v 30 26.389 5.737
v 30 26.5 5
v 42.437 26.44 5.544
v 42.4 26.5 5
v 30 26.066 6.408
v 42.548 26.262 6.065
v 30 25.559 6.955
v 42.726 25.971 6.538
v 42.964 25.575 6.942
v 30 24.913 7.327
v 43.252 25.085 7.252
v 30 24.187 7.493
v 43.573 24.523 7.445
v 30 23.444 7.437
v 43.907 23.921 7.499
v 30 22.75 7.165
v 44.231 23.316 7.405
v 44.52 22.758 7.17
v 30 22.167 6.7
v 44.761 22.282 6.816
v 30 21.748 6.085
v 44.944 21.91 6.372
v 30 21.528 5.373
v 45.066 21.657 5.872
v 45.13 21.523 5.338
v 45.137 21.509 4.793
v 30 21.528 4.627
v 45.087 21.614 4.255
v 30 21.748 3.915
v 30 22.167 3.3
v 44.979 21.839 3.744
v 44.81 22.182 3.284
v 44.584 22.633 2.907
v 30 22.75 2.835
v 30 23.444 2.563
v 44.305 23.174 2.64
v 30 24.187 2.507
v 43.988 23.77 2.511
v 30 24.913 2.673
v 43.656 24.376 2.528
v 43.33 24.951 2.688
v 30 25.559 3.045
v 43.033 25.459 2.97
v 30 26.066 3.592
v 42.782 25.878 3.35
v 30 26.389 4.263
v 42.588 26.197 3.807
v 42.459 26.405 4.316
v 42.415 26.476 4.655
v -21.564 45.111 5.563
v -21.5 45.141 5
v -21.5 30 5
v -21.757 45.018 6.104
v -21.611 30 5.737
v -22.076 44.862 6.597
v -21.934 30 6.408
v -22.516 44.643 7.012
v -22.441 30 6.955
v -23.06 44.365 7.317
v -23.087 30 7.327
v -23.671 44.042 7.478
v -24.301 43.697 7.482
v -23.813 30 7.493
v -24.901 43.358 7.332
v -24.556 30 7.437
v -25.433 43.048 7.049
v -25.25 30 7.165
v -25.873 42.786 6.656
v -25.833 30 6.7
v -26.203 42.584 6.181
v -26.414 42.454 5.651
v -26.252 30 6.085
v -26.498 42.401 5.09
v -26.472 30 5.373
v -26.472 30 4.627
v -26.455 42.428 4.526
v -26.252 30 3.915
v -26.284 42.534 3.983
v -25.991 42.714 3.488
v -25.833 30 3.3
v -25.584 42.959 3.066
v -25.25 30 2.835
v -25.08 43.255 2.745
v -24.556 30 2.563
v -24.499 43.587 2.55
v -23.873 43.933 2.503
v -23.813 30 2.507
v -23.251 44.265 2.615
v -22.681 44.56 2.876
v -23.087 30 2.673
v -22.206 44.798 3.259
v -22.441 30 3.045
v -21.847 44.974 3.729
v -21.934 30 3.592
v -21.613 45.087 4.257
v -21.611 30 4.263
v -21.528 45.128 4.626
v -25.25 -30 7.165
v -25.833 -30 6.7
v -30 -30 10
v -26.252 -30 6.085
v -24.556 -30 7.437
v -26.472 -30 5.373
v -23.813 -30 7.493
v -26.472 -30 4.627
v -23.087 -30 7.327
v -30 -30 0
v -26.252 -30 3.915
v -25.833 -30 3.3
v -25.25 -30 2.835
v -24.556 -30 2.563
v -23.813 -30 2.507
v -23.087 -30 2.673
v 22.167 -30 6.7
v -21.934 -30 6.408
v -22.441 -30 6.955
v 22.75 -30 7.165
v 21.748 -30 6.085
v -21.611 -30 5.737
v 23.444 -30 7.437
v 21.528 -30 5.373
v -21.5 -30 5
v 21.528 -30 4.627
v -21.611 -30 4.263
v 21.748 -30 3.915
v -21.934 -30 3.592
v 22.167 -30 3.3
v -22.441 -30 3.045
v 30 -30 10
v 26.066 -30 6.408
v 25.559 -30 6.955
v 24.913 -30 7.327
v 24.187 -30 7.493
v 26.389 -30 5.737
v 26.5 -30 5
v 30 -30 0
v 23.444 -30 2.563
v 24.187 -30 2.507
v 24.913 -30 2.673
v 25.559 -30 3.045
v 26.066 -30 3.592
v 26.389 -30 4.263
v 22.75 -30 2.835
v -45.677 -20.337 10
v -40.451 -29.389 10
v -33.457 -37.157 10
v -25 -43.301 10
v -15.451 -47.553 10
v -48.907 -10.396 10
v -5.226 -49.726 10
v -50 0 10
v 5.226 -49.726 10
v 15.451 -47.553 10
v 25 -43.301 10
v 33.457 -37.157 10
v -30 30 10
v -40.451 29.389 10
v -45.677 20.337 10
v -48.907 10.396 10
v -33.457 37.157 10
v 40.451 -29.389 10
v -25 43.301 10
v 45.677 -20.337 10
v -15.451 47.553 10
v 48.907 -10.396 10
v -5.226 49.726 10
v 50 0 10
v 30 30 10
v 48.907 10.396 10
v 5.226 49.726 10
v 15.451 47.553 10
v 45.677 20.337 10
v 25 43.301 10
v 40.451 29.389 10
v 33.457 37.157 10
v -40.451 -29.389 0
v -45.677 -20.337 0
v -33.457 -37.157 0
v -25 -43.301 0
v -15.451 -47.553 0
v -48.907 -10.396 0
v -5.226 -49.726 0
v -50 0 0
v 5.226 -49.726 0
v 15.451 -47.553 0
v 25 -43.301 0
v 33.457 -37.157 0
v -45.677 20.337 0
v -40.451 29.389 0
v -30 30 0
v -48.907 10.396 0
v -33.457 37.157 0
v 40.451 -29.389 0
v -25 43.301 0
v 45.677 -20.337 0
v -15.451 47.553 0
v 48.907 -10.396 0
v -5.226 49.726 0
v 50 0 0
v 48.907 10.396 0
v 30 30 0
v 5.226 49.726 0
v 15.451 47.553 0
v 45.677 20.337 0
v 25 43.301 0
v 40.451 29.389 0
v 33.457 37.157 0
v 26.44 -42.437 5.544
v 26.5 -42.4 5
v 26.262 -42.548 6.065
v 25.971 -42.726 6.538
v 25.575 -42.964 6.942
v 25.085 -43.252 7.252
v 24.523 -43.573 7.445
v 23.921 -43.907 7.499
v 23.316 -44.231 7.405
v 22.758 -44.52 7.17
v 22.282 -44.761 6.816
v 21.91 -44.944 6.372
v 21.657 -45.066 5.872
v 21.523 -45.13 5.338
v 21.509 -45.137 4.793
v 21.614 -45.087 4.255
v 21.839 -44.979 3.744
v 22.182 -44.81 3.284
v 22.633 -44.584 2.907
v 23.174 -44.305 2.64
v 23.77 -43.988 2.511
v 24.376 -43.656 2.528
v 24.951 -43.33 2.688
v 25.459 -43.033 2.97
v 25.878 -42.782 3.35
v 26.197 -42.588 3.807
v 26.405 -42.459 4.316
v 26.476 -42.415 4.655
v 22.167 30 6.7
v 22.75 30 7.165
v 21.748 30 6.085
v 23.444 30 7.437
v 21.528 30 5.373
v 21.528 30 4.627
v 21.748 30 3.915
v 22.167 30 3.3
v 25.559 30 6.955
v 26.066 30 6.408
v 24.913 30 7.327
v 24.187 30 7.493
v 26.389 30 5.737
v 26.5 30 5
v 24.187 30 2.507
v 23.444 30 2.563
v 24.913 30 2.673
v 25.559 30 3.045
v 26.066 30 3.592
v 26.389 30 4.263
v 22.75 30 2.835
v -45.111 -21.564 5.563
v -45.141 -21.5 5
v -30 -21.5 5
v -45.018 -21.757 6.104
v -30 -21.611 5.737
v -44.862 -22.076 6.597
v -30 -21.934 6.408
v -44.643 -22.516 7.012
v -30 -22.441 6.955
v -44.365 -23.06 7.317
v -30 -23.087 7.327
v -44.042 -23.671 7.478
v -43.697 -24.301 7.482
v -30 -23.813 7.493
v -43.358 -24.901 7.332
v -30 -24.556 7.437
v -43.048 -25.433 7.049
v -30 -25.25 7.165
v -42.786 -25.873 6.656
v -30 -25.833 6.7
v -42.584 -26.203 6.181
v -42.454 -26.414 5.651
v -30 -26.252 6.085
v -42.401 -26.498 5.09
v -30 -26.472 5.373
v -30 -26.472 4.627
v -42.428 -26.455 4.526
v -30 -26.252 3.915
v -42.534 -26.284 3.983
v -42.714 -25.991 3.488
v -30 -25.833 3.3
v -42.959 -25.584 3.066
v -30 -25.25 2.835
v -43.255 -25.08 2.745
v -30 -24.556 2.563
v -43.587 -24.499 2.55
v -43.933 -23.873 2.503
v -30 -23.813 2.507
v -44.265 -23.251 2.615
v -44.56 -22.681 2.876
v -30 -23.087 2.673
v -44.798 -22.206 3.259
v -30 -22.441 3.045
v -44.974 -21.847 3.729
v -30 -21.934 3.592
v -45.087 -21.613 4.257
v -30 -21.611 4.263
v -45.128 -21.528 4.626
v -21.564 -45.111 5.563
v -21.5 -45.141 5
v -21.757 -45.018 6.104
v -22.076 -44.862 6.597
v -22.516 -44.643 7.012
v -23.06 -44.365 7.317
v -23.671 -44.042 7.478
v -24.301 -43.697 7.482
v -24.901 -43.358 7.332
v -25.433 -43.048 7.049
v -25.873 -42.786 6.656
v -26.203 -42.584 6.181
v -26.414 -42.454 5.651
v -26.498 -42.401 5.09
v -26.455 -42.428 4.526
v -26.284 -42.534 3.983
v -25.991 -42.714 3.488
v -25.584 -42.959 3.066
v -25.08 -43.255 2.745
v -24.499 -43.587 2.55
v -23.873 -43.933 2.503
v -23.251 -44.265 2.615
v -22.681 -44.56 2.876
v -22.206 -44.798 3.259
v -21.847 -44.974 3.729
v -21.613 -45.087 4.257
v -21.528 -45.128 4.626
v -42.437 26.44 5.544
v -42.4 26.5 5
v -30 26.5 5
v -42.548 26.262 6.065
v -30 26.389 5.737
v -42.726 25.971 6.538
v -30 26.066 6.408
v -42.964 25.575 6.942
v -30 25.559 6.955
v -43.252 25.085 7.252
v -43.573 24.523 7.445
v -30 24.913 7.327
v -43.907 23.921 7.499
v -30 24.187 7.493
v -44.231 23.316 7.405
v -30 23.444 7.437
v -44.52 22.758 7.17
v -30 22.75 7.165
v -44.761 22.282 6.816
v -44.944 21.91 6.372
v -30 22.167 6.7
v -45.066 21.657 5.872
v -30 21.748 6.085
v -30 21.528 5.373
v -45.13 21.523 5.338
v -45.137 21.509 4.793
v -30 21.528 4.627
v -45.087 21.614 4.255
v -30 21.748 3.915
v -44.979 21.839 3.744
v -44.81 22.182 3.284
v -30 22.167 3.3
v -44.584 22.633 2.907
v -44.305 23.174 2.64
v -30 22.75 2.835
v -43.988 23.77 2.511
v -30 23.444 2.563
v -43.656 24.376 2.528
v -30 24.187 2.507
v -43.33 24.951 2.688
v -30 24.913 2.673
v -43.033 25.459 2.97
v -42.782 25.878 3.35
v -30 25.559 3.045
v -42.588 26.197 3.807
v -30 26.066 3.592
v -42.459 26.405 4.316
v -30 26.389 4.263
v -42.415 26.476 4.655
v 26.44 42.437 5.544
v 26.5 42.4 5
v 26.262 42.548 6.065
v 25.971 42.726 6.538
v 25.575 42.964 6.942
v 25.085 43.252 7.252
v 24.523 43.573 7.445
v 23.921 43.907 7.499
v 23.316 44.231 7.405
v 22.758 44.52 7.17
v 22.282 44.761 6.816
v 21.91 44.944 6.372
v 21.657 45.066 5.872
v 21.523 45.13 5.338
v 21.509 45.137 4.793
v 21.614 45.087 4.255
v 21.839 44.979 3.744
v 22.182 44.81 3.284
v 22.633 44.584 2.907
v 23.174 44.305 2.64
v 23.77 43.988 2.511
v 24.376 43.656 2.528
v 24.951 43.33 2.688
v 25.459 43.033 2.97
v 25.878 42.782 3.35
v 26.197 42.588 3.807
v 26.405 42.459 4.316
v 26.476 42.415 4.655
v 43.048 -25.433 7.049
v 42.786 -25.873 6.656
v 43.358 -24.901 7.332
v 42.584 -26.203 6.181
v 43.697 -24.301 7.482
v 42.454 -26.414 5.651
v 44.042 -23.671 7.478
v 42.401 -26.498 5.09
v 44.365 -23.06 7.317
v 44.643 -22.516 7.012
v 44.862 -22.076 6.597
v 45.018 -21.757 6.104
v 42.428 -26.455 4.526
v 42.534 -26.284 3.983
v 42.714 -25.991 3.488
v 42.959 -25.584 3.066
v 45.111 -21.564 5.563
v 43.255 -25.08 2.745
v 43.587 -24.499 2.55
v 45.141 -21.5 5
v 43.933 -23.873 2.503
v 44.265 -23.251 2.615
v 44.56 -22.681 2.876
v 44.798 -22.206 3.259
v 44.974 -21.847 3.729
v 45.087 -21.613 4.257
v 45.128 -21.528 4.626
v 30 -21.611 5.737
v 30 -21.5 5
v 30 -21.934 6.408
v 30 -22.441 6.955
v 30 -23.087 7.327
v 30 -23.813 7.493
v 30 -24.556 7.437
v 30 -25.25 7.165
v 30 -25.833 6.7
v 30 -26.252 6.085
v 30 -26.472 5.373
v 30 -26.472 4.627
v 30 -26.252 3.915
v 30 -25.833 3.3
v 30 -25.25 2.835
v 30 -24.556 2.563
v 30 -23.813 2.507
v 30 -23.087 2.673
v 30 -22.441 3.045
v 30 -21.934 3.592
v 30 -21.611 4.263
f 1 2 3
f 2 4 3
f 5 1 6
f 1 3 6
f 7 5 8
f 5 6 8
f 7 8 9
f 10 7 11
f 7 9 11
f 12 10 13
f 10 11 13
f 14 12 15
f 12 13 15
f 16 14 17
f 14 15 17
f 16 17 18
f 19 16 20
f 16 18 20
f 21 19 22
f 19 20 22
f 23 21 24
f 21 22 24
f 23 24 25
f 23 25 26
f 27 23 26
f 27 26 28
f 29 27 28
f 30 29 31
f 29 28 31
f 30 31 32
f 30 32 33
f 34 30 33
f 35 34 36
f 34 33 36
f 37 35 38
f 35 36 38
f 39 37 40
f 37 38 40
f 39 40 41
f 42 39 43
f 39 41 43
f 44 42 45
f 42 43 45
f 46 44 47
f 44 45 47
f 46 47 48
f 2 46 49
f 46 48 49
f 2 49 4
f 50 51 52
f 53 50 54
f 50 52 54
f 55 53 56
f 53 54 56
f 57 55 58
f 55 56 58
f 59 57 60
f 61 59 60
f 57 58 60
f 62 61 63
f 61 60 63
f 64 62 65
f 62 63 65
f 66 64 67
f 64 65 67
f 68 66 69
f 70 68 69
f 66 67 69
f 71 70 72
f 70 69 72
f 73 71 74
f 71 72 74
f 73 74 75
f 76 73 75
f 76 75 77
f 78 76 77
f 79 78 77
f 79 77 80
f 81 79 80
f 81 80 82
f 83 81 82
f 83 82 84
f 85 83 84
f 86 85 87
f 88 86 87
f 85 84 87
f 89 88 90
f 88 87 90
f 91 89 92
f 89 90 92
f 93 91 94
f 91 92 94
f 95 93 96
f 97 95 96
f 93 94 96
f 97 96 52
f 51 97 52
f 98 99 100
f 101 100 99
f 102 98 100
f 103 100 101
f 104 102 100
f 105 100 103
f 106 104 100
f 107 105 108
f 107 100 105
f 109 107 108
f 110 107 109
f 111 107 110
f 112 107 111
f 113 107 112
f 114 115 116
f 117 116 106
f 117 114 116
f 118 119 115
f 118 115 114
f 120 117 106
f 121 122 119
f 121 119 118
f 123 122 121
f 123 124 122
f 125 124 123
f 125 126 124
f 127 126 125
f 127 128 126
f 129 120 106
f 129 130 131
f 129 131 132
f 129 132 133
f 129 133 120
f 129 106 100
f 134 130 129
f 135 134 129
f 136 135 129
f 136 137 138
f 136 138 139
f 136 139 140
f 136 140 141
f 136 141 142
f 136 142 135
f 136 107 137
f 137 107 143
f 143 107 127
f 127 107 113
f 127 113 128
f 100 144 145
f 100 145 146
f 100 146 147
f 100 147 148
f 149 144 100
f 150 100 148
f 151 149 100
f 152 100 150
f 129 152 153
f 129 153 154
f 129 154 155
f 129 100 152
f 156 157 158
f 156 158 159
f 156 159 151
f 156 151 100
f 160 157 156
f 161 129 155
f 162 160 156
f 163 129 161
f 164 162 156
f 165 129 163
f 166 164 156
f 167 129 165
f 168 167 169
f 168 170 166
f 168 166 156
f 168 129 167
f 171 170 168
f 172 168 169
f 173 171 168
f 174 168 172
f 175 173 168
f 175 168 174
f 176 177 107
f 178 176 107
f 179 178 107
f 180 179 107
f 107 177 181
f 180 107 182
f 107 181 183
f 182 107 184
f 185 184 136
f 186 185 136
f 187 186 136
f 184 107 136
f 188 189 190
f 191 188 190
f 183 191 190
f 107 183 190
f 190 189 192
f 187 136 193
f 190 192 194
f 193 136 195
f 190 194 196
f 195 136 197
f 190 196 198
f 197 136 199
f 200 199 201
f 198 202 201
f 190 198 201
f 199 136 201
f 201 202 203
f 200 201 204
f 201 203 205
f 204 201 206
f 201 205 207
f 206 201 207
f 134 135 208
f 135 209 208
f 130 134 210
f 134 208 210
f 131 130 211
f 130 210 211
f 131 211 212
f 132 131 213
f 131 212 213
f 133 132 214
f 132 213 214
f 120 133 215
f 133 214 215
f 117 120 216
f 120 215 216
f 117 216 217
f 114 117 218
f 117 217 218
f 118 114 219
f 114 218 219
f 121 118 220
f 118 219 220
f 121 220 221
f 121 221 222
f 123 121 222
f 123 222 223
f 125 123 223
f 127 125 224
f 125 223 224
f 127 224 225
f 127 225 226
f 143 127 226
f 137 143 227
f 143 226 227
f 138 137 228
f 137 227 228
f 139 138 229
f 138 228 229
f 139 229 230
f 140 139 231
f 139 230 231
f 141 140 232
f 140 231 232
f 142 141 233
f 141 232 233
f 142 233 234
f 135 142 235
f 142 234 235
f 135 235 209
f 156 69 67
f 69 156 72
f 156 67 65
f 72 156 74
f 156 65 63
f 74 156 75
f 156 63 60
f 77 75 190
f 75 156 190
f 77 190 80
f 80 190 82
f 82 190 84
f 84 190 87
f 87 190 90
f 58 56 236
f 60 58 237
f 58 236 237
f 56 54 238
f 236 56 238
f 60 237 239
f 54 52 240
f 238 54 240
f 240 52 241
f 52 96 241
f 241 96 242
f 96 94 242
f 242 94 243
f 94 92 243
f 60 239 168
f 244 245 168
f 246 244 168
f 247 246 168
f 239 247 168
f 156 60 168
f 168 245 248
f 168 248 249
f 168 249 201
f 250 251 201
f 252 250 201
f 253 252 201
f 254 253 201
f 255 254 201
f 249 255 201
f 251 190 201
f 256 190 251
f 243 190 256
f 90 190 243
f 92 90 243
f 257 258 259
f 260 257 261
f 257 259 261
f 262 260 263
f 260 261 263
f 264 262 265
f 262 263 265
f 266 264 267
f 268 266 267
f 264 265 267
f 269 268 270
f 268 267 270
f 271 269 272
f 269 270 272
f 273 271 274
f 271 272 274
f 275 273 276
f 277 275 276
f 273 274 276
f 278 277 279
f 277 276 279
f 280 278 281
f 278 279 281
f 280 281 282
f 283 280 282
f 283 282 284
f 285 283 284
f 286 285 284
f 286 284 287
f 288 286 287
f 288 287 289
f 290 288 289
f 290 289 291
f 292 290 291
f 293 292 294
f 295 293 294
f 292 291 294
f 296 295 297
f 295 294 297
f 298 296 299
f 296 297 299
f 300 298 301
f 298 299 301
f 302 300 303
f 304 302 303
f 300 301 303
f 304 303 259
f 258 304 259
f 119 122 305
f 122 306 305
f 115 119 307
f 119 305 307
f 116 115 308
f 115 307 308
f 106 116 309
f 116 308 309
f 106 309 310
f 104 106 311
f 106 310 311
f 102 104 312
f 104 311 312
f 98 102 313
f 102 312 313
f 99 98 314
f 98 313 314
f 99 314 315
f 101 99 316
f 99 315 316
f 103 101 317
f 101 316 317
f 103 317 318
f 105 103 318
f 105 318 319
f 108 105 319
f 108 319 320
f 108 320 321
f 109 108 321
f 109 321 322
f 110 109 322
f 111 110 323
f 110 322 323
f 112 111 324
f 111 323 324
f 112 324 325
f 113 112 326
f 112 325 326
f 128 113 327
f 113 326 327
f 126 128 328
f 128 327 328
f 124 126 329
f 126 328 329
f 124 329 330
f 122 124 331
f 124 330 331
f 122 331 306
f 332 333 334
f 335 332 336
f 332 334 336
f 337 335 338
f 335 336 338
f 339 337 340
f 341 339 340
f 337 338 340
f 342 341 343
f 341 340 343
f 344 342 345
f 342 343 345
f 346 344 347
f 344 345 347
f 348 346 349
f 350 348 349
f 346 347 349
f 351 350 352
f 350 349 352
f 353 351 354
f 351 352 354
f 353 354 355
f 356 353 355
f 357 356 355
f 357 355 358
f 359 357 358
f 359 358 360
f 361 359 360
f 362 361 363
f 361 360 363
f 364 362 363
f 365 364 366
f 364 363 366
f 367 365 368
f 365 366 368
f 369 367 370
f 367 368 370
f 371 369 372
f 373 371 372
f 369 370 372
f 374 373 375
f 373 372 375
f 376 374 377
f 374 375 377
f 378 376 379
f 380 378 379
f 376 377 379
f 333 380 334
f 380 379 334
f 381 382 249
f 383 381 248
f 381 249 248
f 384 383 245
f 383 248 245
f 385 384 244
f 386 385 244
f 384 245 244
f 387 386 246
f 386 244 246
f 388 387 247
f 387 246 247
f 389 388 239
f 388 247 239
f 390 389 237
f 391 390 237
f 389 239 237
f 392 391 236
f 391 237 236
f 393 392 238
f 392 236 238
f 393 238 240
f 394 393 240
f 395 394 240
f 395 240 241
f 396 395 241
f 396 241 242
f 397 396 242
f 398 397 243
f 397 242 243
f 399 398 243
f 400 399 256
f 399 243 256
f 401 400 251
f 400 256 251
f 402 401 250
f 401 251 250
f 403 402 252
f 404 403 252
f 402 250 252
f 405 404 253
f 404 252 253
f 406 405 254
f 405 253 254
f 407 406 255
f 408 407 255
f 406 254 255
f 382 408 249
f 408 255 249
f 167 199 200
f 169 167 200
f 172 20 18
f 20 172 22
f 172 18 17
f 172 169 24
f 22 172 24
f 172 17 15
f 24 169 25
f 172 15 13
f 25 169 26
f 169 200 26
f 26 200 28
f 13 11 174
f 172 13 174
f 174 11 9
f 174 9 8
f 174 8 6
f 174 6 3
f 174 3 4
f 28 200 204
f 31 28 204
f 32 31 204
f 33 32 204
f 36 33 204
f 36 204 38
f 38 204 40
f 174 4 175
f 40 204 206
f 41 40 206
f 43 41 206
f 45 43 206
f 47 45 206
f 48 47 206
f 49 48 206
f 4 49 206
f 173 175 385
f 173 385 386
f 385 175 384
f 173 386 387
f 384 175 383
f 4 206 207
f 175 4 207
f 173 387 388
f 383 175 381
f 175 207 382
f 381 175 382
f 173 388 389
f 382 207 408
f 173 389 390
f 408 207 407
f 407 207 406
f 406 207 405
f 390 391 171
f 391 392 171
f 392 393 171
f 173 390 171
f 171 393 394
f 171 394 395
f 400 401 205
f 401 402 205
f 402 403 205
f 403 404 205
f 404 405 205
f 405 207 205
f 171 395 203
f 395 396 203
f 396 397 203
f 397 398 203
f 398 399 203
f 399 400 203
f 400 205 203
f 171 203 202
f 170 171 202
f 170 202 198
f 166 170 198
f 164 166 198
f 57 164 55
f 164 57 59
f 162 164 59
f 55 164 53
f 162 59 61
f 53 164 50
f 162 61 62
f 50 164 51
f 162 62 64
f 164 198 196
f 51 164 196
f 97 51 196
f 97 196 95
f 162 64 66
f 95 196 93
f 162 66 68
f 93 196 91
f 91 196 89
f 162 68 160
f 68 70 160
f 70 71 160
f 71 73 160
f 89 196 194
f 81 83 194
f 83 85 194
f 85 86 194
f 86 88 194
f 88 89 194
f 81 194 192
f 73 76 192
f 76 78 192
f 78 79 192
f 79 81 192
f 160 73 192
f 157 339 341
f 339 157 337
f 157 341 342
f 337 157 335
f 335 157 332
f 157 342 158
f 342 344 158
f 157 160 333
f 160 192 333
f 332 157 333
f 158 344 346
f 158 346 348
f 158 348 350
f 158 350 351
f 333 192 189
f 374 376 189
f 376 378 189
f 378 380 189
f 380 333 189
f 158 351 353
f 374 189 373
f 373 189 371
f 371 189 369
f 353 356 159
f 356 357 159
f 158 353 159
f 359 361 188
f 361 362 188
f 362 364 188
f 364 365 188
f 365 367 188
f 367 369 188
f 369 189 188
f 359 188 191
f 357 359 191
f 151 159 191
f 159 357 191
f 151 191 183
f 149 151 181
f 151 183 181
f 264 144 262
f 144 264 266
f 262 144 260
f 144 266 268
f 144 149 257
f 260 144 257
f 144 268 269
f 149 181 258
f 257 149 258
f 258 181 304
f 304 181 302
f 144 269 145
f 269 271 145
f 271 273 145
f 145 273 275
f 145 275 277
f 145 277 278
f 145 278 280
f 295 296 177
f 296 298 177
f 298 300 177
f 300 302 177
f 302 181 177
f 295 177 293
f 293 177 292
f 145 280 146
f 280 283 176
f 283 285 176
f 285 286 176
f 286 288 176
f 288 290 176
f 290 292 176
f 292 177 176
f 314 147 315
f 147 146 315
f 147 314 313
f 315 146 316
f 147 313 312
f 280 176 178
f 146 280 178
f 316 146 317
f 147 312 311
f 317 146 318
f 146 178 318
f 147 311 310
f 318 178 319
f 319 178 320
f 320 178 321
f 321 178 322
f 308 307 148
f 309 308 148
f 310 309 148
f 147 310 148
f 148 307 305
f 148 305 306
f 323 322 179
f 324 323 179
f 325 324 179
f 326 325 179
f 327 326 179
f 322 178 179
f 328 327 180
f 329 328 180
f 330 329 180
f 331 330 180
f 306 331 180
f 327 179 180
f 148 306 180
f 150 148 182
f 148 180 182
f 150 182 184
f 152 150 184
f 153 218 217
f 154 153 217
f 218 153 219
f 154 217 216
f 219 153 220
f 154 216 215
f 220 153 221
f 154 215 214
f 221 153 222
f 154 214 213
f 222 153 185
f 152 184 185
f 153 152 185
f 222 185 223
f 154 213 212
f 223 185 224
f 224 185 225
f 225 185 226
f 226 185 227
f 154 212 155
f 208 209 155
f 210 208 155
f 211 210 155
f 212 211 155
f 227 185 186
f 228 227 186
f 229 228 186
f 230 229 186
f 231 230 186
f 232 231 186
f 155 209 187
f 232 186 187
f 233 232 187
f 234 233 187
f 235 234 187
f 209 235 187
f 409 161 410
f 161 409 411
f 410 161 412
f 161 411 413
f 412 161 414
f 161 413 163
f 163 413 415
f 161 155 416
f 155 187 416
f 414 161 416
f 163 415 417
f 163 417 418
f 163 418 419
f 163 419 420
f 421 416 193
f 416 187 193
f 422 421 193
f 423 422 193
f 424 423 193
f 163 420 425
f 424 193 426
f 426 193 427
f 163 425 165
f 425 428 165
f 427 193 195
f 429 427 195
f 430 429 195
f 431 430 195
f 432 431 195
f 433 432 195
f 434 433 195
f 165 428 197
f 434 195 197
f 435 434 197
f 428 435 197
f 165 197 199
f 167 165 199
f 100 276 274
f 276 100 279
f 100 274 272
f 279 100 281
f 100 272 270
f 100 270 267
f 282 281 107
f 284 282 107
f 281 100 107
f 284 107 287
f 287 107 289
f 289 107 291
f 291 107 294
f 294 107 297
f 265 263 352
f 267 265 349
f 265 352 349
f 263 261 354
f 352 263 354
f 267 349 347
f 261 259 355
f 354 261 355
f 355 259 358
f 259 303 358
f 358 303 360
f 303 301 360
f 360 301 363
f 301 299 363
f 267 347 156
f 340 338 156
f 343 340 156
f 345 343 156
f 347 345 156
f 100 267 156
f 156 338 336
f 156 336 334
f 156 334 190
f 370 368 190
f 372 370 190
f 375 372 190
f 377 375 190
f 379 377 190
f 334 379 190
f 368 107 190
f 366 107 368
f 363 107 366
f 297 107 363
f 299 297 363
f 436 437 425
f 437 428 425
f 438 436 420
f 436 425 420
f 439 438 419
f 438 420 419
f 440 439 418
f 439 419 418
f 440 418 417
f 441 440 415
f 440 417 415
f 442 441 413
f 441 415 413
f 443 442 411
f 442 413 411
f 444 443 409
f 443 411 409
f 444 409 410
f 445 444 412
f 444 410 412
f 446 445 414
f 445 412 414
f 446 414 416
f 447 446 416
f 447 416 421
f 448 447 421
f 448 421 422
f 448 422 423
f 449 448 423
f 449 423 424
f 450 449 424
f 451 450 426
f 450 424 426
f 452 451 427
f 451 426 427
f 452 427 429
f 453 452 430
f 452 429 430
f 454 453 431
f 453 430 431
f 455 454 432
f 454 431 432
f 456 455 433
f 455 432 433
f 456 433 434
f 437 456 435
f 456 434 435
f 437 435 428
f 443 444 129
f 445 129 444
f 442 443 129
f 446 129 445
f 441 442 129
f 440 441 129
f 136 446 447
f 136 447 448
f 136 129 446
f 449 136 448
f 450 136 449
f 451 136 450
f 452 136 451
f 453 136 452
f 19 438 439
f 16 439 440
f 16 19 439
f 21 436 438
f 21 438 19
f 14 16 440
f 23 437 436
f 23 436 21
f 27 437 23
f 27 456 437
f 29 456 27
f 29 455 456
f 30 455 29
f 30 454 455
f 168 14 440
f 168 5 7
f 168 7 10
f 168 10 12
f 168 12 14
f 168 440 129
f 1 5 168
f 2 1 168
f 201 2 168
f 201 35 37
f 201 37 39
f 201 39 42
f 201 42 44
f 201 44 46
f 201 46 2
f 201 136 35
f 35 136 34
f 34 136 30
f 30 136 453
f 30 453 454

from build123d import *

# Parameters (mm, degrees)
F1_R     = 50
F1_W     = 60
F1_H     = 60
F2_DEPTH = 10
F3_R     = 2.5
F4_DEPTH = 145
F6_COUNT = 2
F6_ANGLE = 90


with BuildPart() as f2:
    # F1 (on Top) → F2 (new body)
    with BuildSketch(Plane.XY):
        Circle(F1_R)
        Rectangle(F1_W, F1_H, mode=Mode.SUBTRACT)
    extrude(amount=F2_DEPTH)


with BuildPart() as f4:
    # F3 (on face) → F4 (new body, symmetric)
    with BuildSketch(Plane.XZ.offset(-30)):
        with Locations((-24, 5)):
            Circle(F3_R)
    extrude(amount=F4_DEPTH, both=True)


with BuildPart() as f4b:
    # F3 (on face) → F4, piece 2 (new body, symmetric)
    with BuildSketch(Plane.XZ.offset(-30)):
        with Locations((24, 5)):
            Circle(F3_R)
    extrude(amount=F4_DEPTH, both=True)


with BuildPart() as f6_1:
    # F6: instance of F4
    add(f4.part.rotate(Axis((0, 0, 22.8316206485), (0, 0, 1)), 1 * F6_ANGLE / (F6_COUNT - 1)))


with BuildPart() as f6_2:
    # F6: instance of F4b
    add(f4b.part.rotate(Axis((0, 0, 22.8316206485), (0, 0, 1)), 1 * F6_ANGLE / (F6_COUNT - 1)))


with BuildPart() as f2_1:
    add(f2.part)

    # F7: cut F4, F6_2, F4b, F6_1
    add(f4.part, mode=Mode.SUBTRACT)
    add(f6_2.part, mode=Mode.SUBTRACT)
    add(f4b.part, mode=Mode.SUBTRACT)
    add(f6_1.part, mode=Mode.SUBTRACT)


solid = f2_1.part
